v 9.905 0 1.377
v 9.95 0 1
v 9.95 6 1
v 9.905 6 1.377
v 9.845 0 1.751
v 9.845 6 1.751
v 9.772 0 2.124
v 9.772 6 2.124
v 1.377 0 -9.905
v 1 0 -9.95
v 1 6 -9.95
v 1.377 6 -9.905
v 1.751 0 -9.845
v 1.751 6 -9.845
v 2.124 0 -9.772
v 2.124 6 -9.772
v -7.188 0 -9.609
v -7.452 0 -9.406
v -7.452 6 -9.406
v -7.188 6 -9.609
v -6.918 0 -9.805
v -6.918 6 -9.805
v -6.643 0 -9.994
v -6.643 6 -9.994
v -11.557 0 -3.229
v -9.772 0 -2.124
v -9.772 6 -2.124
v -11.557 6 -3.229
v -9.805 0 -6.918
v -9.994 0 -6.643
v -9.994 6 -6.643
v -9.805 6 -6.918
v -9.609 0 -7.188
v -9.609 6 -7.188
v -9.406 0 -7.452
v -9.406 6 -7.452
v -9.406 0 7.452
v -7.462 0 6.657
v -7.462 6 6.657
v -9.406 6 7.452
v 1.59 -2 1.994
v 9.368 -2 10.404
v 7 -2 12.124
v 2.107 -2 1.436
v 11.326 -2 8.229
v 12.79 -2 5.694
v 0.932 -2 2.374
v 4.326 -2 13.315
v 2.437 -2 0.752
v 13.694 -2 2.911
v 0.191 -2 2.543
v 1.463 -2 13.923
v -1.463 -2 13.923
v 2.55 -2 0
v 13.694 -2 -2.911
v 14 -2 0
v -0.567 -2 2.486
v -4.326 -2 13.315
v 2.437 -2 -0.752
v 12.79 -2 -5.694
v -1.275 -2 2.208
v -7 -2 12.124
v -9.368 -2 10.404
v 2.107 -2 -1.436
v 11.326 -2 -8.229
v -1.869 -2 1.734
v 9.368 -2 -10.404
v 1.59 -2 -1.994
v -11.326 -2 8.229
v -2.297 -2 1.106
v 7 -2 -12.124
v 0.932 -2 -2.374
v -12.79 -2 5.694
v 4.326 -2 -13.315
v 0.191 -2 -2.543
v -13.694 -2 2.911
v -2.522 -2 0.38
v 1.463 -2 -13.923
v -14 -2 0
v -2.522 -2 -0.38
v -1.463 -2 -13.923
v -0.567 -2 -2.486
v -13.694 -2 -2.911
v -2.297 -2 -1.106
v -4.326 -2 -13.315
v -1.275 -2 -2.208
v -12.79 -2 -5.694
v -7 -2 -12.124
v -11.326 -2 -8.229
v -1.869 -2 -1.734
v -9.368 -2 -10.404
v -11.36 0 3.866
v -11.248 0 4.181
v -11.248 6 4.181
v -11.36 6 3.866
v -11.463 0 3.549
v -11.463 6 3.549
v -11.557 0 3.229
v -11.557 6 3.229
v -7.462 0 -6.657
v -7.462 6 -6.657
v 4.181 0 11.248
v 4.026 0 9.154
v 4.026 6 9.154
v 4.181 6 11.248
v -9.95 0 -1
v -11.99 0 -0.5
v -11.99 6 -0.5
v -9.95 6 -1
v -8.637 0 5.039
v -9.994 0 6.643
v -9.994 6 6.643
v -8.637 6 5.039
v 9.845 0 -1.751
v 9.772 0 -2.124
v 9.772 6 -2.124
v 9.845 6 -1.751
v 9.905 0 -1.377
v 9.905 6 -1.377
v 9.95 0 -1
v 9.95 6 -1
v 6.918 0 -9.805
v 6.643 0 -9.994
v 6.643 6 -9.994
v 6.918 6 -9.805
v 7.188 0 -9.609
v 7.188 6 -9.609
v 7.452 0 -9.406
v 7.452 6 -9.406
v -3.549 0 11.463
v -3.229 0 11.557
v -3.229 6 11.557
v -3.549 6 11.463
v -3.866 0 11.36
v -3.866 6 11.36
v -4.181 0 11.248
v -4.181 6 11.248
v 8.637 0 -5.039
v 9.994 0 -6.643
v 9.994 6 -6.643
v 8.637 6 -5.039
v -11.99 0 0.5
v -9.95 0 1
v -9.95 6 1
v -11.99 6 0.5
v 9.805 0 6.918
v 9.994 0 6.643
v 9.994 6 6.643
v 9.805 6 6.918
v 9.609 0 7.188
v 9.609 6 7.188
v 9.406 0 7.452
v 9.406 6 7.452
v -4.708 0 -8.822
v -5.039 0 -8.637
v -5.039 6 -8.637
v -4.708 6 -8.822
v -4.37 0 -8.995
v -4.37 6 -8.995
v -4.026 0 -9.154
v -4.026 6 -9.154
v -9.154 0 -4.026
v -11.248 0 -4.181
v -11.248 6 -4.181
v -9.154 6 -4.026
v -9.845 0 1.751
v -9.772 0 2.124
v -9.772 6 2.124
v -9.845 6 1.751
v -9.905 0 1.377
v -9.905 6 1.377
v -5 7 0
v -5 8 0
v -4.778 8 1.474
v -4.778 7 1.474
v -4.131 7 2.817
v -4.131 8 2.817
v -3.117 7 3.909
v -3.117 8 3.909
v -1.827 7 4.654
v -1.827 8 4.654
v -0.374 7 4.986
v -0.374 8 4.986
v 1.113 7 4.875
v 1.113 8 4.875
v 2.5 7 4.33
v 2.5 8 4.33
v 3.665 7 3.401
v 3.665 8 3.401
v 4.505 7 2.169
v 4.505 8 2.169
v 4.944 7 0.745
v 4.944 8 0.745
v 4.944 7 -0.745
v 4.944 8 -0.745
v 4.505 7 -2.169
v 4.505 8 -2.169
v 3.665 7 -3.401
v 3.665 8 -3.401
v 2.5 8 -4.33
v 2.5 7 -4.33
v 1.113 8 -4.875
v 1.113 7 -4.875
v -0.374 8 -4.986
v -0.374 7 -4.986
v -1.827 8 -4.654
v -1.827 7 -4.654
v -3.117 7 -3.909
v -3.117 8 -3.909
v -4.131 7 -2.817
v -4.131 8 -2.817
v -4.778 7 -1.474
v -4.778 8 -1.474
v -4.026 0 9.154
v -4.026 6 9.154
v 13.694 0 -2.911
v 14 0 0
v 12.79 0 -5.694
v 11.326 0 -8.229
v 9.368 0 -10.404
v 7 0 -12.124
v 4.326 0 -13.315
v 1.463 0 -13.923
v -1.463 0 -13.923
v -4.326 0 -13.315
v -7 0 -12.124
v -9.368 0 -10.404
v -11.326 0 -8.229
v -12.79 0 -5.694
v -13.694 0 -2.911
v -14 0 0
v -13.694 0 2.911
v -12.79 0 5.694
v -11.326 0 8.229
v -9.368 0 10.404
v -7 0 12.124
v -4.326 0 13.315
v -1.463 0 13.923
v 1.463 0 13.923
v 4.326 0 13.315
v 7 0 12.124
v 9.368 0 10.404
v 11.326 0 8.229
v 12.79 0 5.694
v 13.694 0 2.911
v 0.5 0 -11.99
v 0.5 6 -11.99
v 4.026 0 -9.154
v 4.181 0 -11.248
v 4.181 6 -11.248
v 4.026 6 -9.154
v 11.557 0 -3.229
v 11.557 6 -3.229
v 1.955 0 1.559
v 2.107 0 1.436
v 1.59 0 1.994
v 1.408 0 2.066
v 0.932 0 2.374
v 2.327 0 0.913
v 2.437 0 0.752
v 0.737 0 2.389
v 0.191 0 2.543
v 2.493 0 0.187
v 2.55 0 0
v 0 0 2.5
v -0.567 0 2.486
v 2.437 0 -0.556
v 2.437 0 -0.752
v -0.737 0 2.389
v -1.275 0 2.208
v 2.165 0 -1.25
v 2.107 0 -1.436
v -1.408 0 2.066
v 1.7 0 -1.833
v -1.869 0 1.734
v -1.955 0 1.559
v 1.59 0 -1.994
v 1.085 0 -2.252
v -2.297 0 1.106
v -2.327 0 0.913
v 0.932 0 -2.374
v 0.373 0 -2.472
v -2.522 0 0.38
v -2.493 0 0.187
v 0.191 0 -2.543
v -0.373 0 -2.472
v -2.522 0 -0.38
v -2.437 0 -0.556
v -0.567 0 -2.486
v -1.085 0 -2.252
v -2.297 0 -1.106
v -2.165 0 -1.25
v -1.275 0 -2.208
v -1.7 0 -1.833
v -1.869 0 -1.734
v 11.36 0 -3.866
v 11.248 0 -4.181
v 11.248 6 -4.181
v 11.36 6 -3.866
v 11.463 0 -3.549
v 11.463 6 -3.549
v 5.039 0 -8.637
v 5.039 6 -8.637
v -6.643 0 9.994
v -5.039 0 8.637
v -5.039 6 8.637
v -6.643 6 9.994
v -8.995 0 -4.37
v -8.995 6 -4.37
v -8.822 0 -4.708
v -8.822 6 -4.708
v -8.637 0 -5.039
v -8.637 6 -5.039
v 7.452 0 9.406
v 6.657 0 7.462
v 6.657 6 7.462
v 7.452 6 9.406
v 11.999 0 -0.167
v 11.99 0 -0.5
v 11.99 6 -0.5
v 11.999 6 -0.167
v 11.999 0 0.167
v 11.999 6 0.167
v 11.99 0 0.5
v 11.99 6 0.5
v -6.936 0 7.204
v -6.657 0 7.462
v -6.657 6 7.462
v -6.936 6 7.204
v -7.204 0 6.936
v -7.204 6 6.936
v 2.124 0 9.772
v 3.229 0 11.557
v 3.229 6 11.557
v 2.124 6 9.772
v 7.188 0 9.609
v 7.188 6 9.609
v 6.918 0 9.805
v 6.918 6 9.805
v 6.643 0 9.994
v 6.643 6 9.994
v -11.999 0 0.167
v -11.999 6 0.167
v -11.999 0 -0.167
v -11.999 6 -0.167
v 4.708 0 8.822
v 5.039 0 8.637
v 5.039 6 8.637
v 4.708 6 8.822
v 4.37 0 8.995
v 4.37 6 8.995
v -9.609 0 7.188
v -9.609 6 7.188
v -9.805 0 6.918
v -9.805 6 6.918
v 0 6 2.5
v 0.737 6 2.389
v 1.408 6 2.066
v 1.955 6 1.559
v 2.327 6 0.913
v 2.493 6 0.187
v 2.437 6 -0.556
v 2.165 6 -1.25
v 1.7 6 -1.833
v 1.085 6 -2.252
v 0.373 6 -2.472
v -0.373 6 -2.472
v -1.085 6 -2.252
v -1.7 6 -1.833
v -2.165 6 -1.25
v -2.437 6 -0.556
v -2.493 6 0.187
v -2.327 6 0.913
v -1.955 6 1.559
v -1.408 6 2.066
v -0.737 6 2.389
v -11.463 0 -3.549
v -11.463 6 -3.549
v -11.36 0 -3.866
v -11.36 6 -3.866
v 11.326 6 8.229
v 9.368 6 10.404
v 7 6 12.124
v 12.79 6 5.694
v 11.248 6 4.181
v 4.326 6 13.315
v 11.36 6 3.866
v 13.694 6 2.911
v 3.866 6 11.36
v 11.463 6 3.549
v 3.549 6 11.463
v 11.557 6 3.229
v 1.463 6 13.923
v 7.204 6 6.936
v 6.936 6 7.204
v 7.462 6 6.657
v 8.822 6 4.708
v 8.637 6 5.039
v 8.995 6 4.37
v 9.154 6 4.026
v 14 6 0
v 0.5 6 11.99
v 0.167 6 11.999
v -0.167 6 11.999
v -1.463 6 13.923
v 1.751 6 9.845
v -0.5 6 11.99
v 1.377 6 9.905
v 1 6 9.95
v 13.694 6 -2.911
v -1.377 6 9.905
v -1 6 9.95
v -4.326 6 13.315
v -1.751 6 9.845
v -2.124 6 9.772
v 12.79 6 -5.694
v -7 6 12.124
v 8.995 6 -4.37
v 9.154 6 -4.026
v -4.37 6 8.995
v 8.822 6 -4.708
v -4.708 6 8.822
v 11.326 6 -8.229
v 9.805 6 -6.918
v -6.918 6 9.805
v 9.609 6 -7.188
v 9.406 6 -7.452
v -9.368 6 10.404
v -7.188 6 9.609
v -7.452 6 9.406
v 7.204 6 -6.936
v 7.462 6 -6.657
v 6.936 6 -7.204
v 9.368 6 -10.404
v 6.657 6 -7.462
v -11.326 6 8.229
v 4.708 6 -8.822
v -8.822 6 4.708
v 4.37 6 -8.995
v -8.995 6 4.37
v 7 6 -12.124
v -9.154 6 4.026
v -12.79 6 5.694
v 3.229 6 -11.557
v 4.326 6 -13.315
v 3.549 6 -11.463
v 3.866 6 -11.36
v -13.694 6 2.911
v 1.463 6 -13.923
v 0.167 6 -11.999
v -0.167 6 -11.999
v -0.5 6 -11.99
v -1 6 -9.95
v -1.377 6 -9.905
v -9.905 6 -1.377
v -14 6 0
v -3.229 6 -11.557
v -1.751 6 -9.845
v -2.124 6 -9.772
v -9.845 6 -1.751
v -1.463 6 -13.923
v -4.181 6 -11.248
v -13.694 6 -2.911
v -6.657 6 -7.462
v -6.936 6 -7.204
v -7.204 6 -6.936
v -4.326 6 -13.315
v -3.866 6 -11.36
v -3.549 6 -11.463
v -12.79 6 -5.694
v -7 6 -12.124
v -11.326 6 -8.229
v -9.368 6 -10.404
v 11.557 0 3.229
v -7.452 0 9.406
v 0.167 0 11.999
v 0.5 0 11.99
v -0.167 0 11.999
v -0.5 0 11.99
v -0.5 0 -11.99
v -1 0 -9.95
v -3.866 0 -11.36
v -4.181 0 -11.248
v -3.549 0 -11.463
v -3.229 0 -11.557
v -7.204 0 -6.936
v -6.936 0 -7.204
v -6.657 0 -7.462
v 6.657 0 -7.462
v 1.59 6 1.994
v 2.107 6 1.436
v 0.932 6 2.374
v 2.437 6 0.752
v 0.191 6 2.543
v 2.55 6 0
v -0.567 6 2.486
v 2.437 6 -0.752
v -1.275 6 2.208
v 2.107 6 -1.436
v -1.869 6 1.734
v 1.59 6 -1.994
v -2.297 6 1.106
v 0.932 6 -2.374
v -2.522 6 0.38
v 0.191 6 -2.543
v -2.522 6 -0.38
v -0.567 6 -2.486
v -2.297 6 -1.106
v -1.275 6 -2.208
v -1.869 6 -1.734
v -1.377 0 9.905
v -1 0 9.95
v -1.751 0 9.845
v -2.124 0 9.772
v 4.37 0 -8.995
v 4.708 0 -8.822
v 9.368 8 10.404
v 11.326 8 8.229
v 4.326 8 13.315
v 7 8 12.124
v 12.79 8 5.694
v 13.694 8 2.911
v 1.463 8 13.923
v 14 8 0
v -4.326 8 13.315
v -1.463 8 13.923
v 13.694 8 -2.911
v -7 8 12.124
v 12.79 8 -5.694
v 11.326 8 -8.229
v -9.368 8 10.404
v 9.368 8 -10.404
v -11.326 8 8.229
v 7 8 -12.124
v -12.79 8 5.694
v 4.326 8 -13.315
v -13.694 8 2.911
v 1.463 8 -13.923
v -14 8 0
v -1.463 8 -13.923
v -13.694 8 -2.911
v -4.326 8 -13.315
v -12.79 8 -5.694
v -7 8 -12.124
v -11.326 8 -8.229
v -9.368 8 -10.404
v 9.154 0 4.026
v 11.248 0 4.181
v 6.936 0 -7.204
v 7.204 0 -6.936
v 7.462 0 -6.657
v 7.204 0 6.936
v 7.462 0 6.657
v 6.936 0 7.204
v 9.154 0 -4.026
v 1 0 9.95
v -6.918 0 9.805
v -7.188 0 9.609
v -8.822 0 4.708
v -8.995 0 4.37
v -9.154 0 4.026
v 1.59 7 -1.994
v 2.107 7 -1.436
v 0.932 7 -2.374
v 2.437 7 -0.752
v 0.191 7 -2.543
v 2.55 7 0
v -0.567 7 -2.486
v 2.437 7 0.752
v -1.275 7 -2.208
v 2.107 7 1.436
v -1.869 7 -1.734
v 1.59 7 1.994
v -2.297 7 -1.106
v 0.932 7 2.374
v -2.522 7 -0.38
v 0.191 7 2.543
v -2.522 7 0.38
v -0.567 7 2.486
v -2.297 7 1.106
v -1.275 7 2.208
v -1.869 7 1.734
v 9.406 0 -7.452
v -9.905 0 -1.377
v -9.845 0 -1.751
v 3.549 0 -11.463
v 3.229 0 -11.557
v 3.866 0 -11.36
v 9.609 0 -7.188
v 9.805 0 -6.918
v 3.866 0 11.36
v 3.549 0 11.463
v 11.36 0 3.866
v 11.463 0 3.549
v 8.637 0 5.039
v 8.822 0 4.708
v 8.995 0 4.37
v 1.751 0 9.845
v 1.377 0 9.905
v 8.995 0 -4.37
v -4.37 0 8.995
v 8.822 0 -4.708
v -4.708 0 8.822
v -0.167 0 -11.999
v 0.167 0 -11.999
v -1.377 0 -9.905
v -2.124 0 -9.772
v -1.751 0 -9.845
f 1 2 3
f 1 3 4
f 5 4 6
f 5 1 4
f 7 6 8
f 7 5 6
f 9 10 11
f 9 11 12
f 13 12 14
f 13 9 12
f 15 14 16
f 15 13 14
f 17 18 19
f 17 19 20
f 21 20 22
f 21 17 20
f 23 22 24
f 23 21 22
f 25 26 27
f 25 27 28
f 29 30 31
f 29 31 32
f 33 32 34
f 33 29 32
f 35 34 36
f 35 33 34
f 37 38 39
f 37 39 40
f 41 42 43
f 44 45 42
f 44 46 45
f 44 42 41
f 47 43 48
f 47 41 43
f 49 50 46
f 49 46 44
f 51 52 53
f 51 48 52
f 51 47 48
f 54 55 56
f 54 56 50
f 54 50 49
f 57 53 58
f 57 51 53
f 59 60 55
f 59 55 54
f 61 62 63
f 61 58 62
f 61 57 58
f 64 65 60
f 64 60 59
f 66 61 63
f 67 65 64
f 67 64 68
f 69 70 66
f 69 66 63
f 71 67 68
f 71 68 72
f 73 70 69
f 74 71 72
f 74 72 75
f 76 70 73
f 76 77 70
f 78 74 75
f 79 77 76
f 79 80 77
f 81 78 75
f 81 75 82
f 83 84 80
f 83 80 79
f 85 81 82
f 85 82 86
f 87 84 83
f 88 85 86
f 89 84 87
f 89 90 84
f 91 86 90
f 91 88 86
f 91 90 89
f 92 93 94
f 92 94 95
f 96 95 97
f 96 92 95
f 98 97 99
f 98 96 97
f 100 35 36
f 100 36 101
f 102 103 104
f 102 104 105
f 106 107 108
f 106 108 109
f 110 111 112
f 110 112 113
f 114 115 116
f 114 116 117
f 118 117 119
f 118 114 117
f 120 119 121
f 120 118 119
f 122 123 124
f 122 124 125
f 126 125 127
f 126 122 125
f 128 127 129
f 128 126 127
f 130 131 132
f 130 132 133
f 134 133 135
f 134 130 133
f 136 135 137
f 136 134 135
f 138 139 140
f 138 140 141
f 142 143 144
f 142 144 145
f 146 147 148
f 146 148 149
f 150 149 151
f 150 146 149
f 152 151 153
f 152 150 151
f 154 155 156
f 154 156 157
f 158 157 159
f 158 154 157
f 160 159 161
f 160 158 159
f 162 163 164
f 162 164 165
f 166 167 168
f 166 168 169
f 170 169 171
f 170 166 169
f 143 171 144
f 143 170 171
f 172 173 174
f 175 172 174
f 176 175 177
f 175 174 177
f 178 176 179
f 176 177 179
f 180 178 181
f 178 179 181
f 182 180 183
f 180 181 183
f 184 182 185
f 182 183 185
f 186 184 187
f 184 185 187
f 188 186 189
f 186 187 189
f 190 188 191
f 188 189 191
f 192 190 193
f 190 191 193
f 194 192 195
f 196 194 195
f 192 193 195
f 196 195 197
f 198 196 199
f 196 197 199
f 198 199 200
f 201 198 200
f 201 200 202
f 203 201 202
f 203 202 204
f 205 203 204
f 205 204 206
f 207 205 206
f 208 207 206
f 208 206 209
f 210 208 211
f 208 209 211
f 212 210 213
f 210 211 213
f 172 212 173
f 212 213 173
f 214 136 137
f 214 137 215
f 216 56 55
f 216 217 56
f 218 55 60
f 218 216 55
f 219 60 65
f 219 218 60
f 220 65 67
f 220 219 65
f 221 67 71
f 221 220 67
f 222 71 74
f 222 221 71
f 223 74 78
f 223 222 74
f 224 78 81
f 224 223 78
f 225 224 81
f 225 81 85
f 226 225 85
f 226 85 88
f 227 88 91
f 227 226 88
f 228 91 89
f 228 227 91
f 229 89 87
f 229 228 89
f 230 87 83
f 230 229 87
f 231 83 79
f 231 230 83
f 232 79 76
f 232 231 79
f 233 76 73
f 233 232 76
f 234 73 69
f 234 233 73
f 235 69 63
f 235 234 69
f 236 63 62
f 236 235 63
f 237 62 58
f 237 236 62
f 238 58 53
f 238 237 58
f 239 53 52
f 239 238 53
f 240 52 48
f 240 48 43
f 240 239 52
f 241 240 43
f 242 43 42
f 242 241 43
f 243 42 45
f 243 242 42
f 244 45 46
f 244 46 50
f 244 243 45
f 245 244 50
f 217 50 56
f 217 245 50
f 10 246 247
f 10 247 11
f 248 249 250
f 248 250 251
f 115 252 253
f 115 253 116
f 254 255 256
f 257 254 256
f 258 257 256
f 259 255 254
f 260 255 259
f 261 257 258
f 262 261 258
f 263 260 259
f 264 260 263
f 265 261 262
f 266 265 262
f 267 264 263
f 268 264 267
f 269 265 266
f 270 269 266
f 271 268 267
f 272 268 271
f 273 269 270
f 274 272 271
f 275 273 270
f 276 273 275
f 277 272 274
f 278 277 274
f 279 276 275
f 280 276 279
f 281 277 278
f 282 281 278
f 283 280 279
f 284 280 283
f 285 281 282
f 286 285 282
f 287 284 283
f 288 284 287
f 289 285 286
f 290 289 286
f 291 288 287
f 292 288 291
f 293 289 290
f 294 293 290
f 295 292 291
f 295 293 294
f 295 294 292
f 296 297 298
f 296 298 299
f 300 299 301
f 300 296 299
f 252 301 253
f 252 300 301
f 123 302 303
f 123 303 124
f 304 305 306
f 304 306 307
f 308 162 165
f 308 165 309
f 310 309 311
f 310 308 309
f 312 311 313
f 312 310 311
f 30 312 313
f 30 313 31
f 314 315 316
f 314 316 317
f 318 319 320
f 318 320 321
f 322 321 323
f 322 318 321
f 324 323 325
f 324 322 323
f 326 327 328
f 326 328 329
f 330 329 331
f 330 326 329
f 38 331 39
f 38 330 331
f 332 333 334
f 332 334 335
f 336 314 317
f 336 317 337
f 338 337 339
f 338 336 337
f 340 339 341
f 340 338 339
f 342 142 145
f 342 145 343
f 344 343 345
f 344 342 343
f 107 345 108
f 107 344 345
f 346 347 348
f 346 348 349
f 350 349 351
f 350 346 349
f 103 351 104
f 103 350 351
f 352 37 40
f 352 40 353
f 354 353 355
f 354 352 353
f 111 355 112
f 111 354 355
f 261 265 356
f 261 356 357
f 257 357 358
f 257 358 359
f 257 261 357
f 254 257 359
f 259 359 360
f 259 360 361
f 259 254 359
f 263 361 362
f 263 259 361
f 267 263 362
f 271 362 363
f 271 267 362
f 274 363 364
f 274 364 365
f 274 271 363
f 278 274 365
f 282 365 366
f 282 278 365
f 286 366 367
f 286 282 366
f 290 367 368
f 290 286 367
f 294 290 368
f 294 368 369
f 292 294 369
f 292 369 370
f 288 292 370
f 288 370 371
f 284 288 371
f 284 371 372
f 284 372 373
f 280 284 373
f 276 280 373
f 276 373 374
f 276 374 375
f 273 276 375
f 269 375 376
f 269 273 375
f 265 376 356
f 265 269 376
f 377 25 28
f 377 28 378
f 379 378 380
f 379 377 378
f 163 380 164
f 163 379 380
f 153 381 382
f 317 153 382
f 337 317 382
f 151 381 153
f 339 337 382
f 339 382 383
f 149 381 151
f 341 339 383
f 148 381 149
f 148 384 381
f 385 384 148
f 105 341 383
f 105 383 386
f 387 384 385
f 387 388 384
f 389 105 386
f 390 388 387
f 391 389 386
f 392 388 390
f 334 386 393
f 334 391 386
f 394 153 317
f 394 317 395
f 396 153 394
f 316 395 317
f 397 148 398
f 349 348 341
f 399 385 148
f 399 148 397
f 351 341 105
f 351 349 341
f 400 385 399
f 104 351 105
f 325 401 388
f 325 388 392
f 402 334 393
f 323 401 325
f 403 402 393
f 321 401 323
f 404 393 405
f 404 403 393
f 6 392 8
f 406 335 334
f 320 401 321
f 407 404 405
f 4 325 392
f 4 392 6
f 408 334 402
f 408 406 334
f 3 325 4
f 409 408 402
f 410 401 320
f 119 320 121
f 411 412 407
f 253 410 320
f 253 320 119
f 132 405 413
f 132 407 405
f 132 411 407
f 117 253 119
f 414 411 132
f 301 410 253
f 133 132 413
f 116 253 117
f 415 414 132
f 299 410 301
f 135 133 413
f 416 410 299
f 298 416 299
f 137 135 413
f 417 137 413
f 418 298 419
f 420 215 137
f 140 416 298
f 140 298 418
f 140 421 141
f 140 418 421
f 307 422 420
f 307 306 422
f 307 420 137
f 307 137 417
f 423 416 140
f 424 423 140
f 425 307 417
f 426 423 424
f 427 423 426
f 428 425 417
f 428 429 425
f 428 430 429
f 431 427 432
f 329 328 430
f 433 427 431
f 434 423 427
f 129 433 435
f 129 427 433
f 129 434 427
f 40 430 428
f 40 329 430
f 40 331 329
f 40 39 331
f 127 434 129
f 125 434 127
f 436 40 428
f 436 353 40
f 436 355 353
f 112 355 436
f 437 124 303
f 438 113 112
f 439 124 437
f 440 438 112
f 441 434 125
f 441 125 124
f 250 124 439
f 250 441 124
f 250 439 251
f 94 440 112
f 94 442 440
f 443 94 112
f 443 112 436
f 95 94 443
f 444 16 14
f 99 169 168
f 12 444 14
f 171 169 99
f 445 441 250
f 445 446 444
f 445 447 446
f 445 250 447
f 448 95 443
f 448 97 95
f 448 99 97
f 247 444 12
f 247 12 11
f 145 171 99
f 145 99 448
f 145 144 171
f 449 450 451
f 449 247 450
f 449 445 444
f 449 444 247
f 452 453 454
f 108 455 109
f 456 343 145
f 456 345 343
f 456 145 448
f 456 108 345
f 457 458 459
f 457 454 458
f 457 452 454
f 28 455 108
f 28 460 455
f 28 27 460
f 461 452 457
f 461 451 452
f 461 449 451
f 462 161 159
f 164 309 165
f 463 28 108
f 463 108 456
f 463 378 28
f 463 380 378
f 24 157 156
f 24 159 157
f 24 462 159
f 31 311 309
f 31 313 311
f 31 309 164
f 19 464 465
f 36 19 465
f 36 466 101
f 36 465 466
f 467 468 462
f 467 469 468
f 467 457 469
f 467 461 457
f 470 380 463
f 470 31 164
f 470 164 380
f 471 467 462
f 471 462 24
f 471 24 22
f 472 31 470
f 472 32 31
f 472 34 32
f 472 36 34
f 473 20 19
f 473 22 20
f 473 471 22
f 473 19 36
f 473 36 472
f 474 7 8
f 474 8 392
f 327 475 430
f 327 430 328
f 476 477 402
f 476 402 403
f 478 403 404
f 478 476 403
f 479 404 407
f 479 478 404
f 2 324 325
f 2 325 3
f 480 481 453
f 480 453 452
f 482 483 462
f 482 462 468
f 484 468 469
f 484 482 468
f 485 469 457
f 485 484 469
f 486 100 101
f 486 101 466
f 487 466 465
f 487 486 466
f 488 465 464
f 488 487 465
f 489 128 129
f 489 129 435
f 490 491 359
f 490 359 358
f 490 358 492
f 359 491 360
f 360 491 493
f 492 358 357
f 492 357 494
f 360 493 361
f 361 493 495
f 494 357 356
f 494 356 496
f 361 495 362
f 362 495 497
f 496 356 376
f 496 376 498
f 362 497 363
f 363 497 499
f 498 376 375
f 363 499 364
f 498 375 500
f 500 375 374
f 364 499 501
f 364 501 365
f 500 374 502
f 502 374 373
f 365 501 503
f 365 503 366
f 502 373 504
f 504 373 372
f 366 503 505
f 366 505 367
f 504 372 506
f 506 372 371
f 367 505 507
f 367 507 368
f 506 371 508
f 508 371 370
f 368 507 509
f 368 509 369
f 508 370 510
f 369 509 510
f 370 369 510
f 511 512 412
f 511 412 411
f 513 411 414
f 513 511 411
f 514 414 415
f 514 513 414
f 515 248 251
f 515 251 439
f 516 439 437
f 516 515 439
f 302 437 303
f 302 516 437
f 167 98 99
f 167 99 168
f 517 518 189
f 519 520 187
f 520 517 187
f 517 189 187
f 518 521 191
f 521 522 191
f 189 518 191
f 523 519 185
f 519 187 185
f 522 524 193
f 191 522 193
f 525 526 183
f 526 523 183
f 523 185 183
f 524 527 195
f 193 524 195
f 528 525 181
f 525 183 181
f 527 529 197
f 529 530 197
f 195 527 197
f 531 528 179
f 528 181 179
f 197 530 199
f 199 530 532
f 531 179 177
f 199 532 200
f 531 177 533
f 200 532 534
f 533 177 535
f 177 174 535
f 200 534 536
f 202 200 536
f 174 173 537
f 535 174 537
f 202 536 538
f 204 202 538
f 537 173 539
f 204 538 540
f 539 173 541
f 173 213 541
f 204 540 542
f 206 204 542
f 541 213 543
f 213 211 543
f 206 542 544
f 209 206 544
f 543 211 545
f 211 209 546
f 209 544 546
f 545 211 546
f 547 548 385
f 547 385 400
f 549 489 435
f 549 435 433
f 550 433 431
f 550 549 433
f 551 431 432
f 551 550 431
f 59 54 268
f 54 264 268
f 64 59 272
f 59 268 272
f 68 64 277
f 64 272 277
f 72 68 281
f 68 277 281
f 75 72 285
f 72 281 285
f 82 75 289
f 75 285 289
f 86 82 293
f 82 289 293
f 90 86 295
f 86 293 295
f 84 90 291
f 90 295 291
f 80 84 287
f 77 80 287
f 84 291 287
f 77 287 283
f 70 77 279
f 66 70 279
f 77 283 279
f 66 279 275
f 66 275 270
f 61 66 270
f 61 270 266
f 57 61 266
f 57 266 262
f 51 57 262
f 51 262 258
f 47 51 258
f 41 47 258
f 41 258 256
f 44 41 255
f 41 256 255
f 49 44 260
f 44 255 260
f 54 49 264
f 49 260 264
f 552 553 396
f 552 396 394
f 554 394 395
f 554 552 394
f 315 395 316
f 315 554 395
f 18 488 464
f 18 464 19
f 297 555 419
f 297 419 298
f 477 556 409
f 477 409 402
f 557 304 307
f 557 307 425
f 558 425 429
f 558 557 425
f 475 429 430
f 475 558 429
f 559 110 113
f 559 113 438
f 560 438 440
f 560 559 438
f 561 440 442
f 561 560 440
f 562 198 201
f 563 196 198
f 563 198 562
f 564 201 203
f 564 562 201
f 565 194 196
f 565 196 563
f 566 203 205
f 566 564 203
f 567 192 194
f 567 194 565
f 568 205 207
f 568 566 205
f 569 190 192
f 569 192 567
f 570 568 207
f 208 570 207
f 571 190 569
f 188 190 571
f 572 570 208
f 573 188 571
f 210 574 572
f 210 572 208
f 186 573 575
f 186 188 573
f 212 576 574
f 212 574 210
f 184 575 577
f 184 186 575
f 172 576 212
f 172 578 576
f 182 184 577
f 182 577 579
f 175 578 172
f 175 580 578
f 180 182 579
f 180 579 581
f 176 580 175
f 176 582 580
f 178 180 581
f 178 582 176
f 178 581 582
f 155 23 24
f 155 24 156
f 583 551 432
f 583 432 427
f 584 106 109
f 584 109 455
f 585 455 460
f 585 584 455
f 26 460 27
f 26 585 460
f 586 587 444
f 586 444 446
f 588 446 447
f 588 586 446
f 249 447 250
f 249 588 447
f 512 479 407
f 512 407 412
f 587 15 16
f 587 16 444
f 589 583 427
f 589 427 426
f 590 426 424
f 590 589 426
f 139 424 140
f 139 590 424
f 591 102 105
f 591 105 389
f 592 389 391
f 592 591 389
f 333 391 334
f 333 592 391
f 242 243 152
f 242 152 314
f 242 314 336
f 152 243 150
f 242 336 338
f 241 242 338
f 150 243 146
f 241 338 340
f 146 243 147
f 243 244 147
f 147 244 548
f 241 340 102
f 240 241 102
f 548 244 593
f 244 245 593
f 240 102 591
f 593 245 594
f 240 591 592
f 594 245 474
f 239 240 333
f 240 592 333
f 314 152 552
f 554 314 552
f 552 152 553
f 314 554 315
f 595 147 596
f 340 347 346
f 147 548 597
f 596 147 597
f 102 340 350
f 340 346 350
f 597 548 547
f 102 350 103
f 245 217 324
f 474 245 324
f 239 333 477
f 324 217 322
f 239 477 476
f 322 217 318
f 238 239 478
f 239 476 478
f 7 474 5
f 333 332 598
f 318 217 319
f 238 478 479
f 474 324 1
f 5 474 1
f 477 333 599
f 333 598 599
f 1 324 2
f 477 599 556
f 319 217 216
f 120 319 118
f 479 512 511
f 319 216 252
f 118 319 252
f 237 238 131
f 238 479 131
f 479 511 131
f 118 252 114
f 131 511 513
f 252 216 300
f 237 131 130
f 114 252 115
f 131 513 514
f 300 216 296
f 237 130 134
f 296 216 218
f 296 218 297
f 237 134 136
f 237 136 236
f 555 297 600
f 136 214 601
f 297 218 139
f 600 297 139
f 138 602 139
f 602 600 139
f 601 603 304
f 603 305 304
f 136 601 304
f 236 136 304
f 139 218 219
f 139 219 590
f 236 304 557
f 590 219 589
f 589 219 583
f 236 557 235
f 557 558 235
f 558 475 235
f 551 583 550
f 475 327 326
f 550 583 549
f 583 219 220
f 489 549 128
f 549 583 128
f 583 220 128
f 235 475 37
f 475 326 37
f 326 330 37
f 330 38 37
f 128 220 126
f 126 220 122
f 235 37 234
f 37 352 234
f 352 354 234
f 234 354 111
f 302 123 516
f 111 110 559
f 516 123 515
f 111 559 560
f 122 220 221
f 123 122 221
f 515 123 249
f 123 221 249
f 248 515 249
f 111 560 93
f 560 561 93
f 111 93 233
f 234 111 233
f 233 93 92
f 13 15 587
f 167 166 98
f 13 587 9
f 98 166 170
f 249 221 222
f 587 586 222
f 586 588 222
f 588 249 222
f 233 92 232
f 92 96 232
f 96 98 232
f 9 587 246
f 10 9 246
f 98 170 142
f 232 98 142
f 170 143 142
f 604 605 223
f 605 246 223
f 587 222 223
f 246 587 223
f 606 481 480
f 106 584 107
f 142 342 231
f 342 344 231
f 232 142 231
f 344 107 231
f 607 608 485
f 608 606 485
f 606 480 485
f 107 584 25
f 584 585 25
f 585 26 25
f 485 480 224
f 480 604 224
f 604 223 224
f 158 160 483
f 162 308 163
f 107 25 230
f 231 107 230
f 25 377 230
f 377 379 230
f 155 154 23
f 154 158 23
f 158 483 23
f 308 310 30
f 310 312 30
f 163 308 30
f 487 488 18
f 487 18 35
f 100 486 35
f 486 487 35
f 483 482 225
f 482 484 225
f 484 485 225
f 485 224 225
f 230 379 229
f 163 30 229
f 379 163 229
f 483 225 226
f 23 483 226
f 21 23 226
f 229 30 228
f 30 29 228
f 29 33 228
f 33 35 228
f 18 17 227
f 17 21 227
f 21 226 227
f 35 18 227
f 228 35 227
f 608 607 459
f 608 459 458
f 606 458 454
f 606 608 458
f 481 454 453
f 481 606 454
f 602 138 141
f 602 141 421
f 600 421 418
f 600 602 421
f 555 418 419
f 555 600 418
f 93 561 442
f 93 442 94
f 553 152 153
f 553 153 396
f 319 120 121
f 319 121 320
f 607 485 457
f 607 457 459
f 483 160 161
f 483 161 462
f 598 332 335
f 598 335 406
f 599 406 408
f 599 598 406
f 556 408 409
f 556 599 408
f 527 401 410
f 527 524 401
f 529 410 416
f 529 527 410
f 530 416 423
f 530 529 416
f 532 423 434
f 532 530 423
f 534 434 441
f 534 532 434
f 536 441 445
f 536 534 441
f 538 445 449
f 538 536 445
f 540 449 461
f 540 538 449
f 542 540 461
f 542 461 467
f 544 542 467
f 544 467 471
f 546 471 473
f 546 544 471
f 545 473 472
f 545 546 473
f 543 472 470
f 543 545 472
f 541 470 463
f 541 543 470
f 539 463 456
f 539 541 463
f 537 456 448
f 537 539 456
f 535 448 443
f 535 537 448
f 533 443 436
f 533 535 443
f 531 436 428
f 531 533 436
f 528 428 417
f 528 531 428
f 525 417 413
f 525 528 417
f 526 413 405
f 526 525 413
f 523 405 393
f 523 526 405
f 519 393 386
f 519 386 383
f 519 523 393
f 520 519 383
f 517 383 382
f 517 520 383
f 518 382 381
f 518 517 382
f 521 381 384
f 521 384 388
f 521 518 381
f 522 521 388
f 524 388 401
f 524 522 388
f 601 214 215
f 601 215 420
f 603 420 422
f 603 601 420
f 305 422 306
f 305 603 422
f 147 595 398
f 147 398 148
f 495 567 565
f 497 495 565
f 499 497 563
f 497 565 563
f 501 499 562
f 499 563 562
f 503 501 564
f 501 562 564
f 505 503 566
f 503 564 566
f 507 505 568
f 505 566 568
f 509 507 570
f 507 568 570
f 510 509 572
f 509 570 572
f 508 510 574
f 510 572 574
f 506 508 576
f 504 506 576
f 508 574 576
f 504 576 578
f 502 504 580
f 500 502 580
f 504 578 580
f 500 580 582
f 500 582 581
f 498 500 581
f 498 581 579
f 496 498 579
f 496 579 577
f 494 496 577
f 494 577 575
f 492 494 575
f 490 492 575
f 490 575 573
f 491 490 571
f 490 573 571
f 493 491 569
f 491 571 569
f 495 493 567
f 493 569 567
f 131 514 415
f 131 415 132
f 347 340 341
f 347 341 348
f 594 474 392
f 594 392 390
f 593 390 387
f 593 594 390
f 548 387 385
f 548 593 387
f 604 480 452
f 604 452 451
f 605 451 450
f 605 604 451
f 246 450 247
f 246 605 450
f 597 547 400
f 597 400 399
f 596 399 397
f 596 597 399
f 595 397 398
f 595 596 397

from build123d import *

# Parameters (mm, degrees)
SKETCH1_R           = 2.5
BOSS_EXTRUDE1_DEPTH = 6
SKETCH2_W           = 11.45
SKETCH2_H           = 2
SKETCH3_R           = 5
CUT_EXTRUDE1_DEPTH  = 1


with BuildPart() as part:
    # Sketch1 → Boss-Extrude1 (new body)
    with BuildSketch(Plane(origin=(0, 0, 0), x_dir=(1, 0, 0), z_dir=(0, 1, 0))):
        with BuildLine():
            Line((0.5, 11.989578808), (1, 9.949874371))
            ThreePointArc((1, 9.949874371), (1.56434465, 9.876883406), (2.123623756, 9.771909851))
            Line((2.123623756, 9.771909851), (3.229455349, 11.55727555))
            ThreePointArc((3.229455349, 11.55727555), (3.708203932, 11.412678196), (4.180511865, 11.248258556))
            Line((4.180511865, 11.248258556), (4.025736789, 9.153875863))
            ThreePointArc((4.025736789, 9.153875863), (4.539904997, 8.910065242), (5.039372423, 8.63740271))
            Line((5.039372423, 8.63740271), (6.642789108, 9.993665637))
            ThreePointArc((6.642789108, 9.993665637), (7.053423028, 9.708203932), (7.451806102, 9.405880385))
            Line((7.451806102, 9.405880385), (6.657406412, 7.461832206))
            ThreePointArc((6.657406412, 7.461832206), (7.071067812, 7.071067812), (7.461832206, 6.657406412))
            Line((7.461832206, 6.657406412), (9.405880385, 7.451806102))
            ThreePointArc((9.405880385, 7.451806102), (9.708203932, 7.053423028), (9.993665637, 6.642789108))
            Line((9.993665637, 6.642789108), (8.63740271, 5.039372423))
            ThreePointArc((8.63740271, 5.039372423), (8.910065242, 4.539904997), (9.153875863, 4.025736789))
            Line((9.153875863, 4.025736789), (11.248258556, 4.180511865))
            ThreePointArc((11.248258556, 4.180511865), (11.412678196, 3.708203932), (11.55727555, 3.229455349))
            Line((11.55727555, 3.229455349), (9.771909851, 2.123623756))
            ThreePointArc((9.771909851, 2.123623756), (9.876883406, 1.56434465), (9.949874371, 1))
            Line((9.949874371, 1), (11.989578808, 0.5))
            ThreePointArc((11.989578808, 0.5), (12, 0), (11.989578808, -0.5))
            Line((11.989578808, -0.5), (9.949874371, -1))
            ThreePointArc((9.949874371, -1), (9.876883406, -1.56434465), (9.771909851, -2.123623756))
            Line((9.771909851, -2.123623756), (11.55727555, -3.229455349))
            ThreePointArc((11.55727555, -3.229455349), (11.412678196, -3.708203932), (11.248258556, -4.180511865))
            Line((11.248258556, -4.180511865), (9.153875863, -4.025736789))
            ThreePointArc((9.153875863, -4.025736789), (8.910065242, -4.539904997), (8.63740271, -5.039372423))
            Line((8.63740271, -5.039372423), (9.993665637, -6.642789108))
            ThreePointArc((9.993665637, -6.642789108), (9.708203932, -7.053423028), (9.405880385, -7.451806102))
            Line((9.405880385, -7.451806102), (7.461832206, -6.657406412))
            ThreePointArc((7.461832206, -6.657406412), (7.071067812, -7.071067812), (6.657406412, -7.461832206))
            Line((6.657406412, -7.461832206), (7.451806102, -9.405880385))
            ThreePointArc((7.451806102, -9.405880385), (7.053423028, -9.708203932), (6.642789108, -9.993665637))
            Line((6.642789108, -9.993665637), (5.039372423, -8.63740271))
            ThreePointArc((5.039372423, -8.63740271), (4.539904997, -8.910065242), (4.025736789, -9.153875863))
            Line((4.025736789, -9.153875863), (4.180511865, -11.248258556))
            ThreePointArc((4.180511865, -11.248258556), (3.708203932, -11.412678196), (3.229455349, -11.55727555))
            Line((3.229455349, -11.55727555), (2.123623756, -9.771909851))
            ThreePointArc((2.123623756, -9.771909851), (1.56434465, -9.876883406), (1, -9.949874371))
            Line((1, -9.949874371), (0.5, -11.989578808))
            ThreePointArc((0.5, -11.989578808), (0, -12), (-0.5, -11.989578808))
            Line((-0.5, -11.989578808), (-1, -9.949874371))
            ThreePointArc((-1, -9.949874371), (-1.56434465, -9.876883406), (-2.123623756, -9.771909851))
            Line((-2.123623756, -9.771909851), (-3.229455349, -11.55727555))
            ThreePointArc((-3.229455349, -11.55727555), (-3.708203932, -11.412678196), (-4.180511865, -11.248258556))
            Line((-4.180511865, -11.248258556), (-4.025736789, -9.153875863))
            ThreePointArc((-4.025736789, -9.153875863), (-4.539904997, -8.910065242), (-5.039372423, -8.63740271))
            Line((-5.039372423, -8.63740271), (-6.642789108, -9.993665637))
            ThreePointArc((-6.642789108, -9.993665637), (-7.053423028, -9.708203932), (-7.451806102, -9.405880385))
            Line((-7.451806102, -9.405880385), (-6.657406412, -7.461832206))
            ThreePointArc((-6.657406412, -7.461832206), (-7.071067812, -7.071067812), (-7.461832206, -6.657406412))
            Line((-7.461832206, -6.657406412), (-9.405880385, -7.451806102))
            ThreePointArc((-9.405880385, -7.451806102), (-9.708203932, -7.053423028), (-9.993665637, -6.642789108))
            Line((-9.993665637, -6.642789108), (-8.63740271, -5.039372423))
            ThreePointArc((-8.63740271, -5.039372423), (-8.910065242, -4.539904997), (-9.153875863, -4.025736789))
            Line((-9.153875863, -4.025736789), (-11.248258556, -4.180511865))
            ThreePointArc((-11.248258556, -4.180511865), (-11.412678196, -3.708203932), (-11.55727555, -3.229455349))
            Line((-11.55727555, -3.229455349), (-9.771909851, -2.123623756))
            ThreePointArc((-9.771909851, -2.123623756), (-9.876883406, -1.56434465), (-9.949874371, -1))
            Line((-9.949874371, -1), (-11.989578808, -0.5))
            ThreePointArc((-11.989578808, -0.5), (-12, 0), (-11.989578808, 0.5))
            Line((-11.989578808, 0.5), (-9.949874371, 1))
            ThreePointArc((-9.949874371, 1), (-9.876883406, 1.56434465), (-9.771909851, 2.123623756))
            Line((-9.771909851, 2.123623756), (-11.55727555, 3.229455349))
            ThreePointArc((-11.55727555, 3.229455349), (-11.412678196, 3.708203932), (-11.248258556, 4.180511865))
            Line((-11.248258556, 4.180511865), (-9.153875863, 4.025736789))
            ThreePointArc((-9.153875863, 4.025736789), (-8.910065242, 4.539904997), (-8.63740271, 5.039372423))
            Line((-8.63740271, 5.039372423), (-9.993665637, 6.642789108))
            ThreePointArc((-9.993665637, 6.642789108), (-9.708203932, 7.053423028), (-9.405880385, 7.451806102))
            Line((-9.405880385, 7.451806102), (-7.461832206, 6.657406412))
            ThreePointArc((-7.461832206, 6.657406412), (-7.071067812, 7.071067812), (-6.657406412, 7.461832206))
            Line((-6.657406412, 7.461832206), (-7.451806102, 9.405880385))
            ThreePointArc((-7.451806102, 9.405880385), (-7.053423028, 9.708203932), (-6.642789108, 9.993665637))
            Line((-6.642789108, 9.993665637), (-5.039372423, 8.63740271))
            ThreePointArc((-5.039372423, 8.63740271), (-4.539904997, 8.910065242), (-4.025736789, 9.153875863))
            Line((-4.025736789, 9.153875863), (-4.180511865, 11.248258556))
            ThreePointArc((-4.180511865, 11.248258556), (-3.708203932, 11.412678196), (-3.229455349, 11.55727555))
            Line((-3.229455349, 11.55727555), (-2.123623756, 9.771909851))
            ThreePointArc((-2.123623756, 9.771909851), (-1.56434465, 9.876883406), (-1, 9.949874371))
            Line((-1, 9.949874371), (-0.5, 11.989578808))
            ThreePointArc((-0.5, 11.989578808), (0, 12), (0.5, 11.989578808))
        make_face()
        with Locations(Location((0, 0, 0), (0, 0, 270))):
            Circle(SKETCH1_R, mode=Mode.SUBTRACT)
    extrude(amount=BOSS_EXTRUDE1_DEPTH)

    # Sketch2 → Revolve1 (revolve)
    with BuildSketch(Plane.XY):
        with Locations((8.275, -1)):
            Rectangle(SKETCH2_W, SKETCH2_H)
        with Locations((8.275, 7)):
            Rectangle(SKETCH2_W, SKETCH2_H)
    revolve(axis=Axis((0, -1000, 0), (0, 1, 0)))

    # Sketch3 → Cut-Extrude1 (cut)
    with BuildSketch(Plane(origin=(0, 8, 0), x_dir=(1, 0, 0), z_dir=(0, 1, 0))):
        with Locations(Location((0, 0, 0), (0, 0, 180))):
            Circle(SKETCH3_R)
    extrude(amount=-CUT_EXTRUDE1_DEPTH, mode=Mode.SUBTRACT)


solid = part.part
